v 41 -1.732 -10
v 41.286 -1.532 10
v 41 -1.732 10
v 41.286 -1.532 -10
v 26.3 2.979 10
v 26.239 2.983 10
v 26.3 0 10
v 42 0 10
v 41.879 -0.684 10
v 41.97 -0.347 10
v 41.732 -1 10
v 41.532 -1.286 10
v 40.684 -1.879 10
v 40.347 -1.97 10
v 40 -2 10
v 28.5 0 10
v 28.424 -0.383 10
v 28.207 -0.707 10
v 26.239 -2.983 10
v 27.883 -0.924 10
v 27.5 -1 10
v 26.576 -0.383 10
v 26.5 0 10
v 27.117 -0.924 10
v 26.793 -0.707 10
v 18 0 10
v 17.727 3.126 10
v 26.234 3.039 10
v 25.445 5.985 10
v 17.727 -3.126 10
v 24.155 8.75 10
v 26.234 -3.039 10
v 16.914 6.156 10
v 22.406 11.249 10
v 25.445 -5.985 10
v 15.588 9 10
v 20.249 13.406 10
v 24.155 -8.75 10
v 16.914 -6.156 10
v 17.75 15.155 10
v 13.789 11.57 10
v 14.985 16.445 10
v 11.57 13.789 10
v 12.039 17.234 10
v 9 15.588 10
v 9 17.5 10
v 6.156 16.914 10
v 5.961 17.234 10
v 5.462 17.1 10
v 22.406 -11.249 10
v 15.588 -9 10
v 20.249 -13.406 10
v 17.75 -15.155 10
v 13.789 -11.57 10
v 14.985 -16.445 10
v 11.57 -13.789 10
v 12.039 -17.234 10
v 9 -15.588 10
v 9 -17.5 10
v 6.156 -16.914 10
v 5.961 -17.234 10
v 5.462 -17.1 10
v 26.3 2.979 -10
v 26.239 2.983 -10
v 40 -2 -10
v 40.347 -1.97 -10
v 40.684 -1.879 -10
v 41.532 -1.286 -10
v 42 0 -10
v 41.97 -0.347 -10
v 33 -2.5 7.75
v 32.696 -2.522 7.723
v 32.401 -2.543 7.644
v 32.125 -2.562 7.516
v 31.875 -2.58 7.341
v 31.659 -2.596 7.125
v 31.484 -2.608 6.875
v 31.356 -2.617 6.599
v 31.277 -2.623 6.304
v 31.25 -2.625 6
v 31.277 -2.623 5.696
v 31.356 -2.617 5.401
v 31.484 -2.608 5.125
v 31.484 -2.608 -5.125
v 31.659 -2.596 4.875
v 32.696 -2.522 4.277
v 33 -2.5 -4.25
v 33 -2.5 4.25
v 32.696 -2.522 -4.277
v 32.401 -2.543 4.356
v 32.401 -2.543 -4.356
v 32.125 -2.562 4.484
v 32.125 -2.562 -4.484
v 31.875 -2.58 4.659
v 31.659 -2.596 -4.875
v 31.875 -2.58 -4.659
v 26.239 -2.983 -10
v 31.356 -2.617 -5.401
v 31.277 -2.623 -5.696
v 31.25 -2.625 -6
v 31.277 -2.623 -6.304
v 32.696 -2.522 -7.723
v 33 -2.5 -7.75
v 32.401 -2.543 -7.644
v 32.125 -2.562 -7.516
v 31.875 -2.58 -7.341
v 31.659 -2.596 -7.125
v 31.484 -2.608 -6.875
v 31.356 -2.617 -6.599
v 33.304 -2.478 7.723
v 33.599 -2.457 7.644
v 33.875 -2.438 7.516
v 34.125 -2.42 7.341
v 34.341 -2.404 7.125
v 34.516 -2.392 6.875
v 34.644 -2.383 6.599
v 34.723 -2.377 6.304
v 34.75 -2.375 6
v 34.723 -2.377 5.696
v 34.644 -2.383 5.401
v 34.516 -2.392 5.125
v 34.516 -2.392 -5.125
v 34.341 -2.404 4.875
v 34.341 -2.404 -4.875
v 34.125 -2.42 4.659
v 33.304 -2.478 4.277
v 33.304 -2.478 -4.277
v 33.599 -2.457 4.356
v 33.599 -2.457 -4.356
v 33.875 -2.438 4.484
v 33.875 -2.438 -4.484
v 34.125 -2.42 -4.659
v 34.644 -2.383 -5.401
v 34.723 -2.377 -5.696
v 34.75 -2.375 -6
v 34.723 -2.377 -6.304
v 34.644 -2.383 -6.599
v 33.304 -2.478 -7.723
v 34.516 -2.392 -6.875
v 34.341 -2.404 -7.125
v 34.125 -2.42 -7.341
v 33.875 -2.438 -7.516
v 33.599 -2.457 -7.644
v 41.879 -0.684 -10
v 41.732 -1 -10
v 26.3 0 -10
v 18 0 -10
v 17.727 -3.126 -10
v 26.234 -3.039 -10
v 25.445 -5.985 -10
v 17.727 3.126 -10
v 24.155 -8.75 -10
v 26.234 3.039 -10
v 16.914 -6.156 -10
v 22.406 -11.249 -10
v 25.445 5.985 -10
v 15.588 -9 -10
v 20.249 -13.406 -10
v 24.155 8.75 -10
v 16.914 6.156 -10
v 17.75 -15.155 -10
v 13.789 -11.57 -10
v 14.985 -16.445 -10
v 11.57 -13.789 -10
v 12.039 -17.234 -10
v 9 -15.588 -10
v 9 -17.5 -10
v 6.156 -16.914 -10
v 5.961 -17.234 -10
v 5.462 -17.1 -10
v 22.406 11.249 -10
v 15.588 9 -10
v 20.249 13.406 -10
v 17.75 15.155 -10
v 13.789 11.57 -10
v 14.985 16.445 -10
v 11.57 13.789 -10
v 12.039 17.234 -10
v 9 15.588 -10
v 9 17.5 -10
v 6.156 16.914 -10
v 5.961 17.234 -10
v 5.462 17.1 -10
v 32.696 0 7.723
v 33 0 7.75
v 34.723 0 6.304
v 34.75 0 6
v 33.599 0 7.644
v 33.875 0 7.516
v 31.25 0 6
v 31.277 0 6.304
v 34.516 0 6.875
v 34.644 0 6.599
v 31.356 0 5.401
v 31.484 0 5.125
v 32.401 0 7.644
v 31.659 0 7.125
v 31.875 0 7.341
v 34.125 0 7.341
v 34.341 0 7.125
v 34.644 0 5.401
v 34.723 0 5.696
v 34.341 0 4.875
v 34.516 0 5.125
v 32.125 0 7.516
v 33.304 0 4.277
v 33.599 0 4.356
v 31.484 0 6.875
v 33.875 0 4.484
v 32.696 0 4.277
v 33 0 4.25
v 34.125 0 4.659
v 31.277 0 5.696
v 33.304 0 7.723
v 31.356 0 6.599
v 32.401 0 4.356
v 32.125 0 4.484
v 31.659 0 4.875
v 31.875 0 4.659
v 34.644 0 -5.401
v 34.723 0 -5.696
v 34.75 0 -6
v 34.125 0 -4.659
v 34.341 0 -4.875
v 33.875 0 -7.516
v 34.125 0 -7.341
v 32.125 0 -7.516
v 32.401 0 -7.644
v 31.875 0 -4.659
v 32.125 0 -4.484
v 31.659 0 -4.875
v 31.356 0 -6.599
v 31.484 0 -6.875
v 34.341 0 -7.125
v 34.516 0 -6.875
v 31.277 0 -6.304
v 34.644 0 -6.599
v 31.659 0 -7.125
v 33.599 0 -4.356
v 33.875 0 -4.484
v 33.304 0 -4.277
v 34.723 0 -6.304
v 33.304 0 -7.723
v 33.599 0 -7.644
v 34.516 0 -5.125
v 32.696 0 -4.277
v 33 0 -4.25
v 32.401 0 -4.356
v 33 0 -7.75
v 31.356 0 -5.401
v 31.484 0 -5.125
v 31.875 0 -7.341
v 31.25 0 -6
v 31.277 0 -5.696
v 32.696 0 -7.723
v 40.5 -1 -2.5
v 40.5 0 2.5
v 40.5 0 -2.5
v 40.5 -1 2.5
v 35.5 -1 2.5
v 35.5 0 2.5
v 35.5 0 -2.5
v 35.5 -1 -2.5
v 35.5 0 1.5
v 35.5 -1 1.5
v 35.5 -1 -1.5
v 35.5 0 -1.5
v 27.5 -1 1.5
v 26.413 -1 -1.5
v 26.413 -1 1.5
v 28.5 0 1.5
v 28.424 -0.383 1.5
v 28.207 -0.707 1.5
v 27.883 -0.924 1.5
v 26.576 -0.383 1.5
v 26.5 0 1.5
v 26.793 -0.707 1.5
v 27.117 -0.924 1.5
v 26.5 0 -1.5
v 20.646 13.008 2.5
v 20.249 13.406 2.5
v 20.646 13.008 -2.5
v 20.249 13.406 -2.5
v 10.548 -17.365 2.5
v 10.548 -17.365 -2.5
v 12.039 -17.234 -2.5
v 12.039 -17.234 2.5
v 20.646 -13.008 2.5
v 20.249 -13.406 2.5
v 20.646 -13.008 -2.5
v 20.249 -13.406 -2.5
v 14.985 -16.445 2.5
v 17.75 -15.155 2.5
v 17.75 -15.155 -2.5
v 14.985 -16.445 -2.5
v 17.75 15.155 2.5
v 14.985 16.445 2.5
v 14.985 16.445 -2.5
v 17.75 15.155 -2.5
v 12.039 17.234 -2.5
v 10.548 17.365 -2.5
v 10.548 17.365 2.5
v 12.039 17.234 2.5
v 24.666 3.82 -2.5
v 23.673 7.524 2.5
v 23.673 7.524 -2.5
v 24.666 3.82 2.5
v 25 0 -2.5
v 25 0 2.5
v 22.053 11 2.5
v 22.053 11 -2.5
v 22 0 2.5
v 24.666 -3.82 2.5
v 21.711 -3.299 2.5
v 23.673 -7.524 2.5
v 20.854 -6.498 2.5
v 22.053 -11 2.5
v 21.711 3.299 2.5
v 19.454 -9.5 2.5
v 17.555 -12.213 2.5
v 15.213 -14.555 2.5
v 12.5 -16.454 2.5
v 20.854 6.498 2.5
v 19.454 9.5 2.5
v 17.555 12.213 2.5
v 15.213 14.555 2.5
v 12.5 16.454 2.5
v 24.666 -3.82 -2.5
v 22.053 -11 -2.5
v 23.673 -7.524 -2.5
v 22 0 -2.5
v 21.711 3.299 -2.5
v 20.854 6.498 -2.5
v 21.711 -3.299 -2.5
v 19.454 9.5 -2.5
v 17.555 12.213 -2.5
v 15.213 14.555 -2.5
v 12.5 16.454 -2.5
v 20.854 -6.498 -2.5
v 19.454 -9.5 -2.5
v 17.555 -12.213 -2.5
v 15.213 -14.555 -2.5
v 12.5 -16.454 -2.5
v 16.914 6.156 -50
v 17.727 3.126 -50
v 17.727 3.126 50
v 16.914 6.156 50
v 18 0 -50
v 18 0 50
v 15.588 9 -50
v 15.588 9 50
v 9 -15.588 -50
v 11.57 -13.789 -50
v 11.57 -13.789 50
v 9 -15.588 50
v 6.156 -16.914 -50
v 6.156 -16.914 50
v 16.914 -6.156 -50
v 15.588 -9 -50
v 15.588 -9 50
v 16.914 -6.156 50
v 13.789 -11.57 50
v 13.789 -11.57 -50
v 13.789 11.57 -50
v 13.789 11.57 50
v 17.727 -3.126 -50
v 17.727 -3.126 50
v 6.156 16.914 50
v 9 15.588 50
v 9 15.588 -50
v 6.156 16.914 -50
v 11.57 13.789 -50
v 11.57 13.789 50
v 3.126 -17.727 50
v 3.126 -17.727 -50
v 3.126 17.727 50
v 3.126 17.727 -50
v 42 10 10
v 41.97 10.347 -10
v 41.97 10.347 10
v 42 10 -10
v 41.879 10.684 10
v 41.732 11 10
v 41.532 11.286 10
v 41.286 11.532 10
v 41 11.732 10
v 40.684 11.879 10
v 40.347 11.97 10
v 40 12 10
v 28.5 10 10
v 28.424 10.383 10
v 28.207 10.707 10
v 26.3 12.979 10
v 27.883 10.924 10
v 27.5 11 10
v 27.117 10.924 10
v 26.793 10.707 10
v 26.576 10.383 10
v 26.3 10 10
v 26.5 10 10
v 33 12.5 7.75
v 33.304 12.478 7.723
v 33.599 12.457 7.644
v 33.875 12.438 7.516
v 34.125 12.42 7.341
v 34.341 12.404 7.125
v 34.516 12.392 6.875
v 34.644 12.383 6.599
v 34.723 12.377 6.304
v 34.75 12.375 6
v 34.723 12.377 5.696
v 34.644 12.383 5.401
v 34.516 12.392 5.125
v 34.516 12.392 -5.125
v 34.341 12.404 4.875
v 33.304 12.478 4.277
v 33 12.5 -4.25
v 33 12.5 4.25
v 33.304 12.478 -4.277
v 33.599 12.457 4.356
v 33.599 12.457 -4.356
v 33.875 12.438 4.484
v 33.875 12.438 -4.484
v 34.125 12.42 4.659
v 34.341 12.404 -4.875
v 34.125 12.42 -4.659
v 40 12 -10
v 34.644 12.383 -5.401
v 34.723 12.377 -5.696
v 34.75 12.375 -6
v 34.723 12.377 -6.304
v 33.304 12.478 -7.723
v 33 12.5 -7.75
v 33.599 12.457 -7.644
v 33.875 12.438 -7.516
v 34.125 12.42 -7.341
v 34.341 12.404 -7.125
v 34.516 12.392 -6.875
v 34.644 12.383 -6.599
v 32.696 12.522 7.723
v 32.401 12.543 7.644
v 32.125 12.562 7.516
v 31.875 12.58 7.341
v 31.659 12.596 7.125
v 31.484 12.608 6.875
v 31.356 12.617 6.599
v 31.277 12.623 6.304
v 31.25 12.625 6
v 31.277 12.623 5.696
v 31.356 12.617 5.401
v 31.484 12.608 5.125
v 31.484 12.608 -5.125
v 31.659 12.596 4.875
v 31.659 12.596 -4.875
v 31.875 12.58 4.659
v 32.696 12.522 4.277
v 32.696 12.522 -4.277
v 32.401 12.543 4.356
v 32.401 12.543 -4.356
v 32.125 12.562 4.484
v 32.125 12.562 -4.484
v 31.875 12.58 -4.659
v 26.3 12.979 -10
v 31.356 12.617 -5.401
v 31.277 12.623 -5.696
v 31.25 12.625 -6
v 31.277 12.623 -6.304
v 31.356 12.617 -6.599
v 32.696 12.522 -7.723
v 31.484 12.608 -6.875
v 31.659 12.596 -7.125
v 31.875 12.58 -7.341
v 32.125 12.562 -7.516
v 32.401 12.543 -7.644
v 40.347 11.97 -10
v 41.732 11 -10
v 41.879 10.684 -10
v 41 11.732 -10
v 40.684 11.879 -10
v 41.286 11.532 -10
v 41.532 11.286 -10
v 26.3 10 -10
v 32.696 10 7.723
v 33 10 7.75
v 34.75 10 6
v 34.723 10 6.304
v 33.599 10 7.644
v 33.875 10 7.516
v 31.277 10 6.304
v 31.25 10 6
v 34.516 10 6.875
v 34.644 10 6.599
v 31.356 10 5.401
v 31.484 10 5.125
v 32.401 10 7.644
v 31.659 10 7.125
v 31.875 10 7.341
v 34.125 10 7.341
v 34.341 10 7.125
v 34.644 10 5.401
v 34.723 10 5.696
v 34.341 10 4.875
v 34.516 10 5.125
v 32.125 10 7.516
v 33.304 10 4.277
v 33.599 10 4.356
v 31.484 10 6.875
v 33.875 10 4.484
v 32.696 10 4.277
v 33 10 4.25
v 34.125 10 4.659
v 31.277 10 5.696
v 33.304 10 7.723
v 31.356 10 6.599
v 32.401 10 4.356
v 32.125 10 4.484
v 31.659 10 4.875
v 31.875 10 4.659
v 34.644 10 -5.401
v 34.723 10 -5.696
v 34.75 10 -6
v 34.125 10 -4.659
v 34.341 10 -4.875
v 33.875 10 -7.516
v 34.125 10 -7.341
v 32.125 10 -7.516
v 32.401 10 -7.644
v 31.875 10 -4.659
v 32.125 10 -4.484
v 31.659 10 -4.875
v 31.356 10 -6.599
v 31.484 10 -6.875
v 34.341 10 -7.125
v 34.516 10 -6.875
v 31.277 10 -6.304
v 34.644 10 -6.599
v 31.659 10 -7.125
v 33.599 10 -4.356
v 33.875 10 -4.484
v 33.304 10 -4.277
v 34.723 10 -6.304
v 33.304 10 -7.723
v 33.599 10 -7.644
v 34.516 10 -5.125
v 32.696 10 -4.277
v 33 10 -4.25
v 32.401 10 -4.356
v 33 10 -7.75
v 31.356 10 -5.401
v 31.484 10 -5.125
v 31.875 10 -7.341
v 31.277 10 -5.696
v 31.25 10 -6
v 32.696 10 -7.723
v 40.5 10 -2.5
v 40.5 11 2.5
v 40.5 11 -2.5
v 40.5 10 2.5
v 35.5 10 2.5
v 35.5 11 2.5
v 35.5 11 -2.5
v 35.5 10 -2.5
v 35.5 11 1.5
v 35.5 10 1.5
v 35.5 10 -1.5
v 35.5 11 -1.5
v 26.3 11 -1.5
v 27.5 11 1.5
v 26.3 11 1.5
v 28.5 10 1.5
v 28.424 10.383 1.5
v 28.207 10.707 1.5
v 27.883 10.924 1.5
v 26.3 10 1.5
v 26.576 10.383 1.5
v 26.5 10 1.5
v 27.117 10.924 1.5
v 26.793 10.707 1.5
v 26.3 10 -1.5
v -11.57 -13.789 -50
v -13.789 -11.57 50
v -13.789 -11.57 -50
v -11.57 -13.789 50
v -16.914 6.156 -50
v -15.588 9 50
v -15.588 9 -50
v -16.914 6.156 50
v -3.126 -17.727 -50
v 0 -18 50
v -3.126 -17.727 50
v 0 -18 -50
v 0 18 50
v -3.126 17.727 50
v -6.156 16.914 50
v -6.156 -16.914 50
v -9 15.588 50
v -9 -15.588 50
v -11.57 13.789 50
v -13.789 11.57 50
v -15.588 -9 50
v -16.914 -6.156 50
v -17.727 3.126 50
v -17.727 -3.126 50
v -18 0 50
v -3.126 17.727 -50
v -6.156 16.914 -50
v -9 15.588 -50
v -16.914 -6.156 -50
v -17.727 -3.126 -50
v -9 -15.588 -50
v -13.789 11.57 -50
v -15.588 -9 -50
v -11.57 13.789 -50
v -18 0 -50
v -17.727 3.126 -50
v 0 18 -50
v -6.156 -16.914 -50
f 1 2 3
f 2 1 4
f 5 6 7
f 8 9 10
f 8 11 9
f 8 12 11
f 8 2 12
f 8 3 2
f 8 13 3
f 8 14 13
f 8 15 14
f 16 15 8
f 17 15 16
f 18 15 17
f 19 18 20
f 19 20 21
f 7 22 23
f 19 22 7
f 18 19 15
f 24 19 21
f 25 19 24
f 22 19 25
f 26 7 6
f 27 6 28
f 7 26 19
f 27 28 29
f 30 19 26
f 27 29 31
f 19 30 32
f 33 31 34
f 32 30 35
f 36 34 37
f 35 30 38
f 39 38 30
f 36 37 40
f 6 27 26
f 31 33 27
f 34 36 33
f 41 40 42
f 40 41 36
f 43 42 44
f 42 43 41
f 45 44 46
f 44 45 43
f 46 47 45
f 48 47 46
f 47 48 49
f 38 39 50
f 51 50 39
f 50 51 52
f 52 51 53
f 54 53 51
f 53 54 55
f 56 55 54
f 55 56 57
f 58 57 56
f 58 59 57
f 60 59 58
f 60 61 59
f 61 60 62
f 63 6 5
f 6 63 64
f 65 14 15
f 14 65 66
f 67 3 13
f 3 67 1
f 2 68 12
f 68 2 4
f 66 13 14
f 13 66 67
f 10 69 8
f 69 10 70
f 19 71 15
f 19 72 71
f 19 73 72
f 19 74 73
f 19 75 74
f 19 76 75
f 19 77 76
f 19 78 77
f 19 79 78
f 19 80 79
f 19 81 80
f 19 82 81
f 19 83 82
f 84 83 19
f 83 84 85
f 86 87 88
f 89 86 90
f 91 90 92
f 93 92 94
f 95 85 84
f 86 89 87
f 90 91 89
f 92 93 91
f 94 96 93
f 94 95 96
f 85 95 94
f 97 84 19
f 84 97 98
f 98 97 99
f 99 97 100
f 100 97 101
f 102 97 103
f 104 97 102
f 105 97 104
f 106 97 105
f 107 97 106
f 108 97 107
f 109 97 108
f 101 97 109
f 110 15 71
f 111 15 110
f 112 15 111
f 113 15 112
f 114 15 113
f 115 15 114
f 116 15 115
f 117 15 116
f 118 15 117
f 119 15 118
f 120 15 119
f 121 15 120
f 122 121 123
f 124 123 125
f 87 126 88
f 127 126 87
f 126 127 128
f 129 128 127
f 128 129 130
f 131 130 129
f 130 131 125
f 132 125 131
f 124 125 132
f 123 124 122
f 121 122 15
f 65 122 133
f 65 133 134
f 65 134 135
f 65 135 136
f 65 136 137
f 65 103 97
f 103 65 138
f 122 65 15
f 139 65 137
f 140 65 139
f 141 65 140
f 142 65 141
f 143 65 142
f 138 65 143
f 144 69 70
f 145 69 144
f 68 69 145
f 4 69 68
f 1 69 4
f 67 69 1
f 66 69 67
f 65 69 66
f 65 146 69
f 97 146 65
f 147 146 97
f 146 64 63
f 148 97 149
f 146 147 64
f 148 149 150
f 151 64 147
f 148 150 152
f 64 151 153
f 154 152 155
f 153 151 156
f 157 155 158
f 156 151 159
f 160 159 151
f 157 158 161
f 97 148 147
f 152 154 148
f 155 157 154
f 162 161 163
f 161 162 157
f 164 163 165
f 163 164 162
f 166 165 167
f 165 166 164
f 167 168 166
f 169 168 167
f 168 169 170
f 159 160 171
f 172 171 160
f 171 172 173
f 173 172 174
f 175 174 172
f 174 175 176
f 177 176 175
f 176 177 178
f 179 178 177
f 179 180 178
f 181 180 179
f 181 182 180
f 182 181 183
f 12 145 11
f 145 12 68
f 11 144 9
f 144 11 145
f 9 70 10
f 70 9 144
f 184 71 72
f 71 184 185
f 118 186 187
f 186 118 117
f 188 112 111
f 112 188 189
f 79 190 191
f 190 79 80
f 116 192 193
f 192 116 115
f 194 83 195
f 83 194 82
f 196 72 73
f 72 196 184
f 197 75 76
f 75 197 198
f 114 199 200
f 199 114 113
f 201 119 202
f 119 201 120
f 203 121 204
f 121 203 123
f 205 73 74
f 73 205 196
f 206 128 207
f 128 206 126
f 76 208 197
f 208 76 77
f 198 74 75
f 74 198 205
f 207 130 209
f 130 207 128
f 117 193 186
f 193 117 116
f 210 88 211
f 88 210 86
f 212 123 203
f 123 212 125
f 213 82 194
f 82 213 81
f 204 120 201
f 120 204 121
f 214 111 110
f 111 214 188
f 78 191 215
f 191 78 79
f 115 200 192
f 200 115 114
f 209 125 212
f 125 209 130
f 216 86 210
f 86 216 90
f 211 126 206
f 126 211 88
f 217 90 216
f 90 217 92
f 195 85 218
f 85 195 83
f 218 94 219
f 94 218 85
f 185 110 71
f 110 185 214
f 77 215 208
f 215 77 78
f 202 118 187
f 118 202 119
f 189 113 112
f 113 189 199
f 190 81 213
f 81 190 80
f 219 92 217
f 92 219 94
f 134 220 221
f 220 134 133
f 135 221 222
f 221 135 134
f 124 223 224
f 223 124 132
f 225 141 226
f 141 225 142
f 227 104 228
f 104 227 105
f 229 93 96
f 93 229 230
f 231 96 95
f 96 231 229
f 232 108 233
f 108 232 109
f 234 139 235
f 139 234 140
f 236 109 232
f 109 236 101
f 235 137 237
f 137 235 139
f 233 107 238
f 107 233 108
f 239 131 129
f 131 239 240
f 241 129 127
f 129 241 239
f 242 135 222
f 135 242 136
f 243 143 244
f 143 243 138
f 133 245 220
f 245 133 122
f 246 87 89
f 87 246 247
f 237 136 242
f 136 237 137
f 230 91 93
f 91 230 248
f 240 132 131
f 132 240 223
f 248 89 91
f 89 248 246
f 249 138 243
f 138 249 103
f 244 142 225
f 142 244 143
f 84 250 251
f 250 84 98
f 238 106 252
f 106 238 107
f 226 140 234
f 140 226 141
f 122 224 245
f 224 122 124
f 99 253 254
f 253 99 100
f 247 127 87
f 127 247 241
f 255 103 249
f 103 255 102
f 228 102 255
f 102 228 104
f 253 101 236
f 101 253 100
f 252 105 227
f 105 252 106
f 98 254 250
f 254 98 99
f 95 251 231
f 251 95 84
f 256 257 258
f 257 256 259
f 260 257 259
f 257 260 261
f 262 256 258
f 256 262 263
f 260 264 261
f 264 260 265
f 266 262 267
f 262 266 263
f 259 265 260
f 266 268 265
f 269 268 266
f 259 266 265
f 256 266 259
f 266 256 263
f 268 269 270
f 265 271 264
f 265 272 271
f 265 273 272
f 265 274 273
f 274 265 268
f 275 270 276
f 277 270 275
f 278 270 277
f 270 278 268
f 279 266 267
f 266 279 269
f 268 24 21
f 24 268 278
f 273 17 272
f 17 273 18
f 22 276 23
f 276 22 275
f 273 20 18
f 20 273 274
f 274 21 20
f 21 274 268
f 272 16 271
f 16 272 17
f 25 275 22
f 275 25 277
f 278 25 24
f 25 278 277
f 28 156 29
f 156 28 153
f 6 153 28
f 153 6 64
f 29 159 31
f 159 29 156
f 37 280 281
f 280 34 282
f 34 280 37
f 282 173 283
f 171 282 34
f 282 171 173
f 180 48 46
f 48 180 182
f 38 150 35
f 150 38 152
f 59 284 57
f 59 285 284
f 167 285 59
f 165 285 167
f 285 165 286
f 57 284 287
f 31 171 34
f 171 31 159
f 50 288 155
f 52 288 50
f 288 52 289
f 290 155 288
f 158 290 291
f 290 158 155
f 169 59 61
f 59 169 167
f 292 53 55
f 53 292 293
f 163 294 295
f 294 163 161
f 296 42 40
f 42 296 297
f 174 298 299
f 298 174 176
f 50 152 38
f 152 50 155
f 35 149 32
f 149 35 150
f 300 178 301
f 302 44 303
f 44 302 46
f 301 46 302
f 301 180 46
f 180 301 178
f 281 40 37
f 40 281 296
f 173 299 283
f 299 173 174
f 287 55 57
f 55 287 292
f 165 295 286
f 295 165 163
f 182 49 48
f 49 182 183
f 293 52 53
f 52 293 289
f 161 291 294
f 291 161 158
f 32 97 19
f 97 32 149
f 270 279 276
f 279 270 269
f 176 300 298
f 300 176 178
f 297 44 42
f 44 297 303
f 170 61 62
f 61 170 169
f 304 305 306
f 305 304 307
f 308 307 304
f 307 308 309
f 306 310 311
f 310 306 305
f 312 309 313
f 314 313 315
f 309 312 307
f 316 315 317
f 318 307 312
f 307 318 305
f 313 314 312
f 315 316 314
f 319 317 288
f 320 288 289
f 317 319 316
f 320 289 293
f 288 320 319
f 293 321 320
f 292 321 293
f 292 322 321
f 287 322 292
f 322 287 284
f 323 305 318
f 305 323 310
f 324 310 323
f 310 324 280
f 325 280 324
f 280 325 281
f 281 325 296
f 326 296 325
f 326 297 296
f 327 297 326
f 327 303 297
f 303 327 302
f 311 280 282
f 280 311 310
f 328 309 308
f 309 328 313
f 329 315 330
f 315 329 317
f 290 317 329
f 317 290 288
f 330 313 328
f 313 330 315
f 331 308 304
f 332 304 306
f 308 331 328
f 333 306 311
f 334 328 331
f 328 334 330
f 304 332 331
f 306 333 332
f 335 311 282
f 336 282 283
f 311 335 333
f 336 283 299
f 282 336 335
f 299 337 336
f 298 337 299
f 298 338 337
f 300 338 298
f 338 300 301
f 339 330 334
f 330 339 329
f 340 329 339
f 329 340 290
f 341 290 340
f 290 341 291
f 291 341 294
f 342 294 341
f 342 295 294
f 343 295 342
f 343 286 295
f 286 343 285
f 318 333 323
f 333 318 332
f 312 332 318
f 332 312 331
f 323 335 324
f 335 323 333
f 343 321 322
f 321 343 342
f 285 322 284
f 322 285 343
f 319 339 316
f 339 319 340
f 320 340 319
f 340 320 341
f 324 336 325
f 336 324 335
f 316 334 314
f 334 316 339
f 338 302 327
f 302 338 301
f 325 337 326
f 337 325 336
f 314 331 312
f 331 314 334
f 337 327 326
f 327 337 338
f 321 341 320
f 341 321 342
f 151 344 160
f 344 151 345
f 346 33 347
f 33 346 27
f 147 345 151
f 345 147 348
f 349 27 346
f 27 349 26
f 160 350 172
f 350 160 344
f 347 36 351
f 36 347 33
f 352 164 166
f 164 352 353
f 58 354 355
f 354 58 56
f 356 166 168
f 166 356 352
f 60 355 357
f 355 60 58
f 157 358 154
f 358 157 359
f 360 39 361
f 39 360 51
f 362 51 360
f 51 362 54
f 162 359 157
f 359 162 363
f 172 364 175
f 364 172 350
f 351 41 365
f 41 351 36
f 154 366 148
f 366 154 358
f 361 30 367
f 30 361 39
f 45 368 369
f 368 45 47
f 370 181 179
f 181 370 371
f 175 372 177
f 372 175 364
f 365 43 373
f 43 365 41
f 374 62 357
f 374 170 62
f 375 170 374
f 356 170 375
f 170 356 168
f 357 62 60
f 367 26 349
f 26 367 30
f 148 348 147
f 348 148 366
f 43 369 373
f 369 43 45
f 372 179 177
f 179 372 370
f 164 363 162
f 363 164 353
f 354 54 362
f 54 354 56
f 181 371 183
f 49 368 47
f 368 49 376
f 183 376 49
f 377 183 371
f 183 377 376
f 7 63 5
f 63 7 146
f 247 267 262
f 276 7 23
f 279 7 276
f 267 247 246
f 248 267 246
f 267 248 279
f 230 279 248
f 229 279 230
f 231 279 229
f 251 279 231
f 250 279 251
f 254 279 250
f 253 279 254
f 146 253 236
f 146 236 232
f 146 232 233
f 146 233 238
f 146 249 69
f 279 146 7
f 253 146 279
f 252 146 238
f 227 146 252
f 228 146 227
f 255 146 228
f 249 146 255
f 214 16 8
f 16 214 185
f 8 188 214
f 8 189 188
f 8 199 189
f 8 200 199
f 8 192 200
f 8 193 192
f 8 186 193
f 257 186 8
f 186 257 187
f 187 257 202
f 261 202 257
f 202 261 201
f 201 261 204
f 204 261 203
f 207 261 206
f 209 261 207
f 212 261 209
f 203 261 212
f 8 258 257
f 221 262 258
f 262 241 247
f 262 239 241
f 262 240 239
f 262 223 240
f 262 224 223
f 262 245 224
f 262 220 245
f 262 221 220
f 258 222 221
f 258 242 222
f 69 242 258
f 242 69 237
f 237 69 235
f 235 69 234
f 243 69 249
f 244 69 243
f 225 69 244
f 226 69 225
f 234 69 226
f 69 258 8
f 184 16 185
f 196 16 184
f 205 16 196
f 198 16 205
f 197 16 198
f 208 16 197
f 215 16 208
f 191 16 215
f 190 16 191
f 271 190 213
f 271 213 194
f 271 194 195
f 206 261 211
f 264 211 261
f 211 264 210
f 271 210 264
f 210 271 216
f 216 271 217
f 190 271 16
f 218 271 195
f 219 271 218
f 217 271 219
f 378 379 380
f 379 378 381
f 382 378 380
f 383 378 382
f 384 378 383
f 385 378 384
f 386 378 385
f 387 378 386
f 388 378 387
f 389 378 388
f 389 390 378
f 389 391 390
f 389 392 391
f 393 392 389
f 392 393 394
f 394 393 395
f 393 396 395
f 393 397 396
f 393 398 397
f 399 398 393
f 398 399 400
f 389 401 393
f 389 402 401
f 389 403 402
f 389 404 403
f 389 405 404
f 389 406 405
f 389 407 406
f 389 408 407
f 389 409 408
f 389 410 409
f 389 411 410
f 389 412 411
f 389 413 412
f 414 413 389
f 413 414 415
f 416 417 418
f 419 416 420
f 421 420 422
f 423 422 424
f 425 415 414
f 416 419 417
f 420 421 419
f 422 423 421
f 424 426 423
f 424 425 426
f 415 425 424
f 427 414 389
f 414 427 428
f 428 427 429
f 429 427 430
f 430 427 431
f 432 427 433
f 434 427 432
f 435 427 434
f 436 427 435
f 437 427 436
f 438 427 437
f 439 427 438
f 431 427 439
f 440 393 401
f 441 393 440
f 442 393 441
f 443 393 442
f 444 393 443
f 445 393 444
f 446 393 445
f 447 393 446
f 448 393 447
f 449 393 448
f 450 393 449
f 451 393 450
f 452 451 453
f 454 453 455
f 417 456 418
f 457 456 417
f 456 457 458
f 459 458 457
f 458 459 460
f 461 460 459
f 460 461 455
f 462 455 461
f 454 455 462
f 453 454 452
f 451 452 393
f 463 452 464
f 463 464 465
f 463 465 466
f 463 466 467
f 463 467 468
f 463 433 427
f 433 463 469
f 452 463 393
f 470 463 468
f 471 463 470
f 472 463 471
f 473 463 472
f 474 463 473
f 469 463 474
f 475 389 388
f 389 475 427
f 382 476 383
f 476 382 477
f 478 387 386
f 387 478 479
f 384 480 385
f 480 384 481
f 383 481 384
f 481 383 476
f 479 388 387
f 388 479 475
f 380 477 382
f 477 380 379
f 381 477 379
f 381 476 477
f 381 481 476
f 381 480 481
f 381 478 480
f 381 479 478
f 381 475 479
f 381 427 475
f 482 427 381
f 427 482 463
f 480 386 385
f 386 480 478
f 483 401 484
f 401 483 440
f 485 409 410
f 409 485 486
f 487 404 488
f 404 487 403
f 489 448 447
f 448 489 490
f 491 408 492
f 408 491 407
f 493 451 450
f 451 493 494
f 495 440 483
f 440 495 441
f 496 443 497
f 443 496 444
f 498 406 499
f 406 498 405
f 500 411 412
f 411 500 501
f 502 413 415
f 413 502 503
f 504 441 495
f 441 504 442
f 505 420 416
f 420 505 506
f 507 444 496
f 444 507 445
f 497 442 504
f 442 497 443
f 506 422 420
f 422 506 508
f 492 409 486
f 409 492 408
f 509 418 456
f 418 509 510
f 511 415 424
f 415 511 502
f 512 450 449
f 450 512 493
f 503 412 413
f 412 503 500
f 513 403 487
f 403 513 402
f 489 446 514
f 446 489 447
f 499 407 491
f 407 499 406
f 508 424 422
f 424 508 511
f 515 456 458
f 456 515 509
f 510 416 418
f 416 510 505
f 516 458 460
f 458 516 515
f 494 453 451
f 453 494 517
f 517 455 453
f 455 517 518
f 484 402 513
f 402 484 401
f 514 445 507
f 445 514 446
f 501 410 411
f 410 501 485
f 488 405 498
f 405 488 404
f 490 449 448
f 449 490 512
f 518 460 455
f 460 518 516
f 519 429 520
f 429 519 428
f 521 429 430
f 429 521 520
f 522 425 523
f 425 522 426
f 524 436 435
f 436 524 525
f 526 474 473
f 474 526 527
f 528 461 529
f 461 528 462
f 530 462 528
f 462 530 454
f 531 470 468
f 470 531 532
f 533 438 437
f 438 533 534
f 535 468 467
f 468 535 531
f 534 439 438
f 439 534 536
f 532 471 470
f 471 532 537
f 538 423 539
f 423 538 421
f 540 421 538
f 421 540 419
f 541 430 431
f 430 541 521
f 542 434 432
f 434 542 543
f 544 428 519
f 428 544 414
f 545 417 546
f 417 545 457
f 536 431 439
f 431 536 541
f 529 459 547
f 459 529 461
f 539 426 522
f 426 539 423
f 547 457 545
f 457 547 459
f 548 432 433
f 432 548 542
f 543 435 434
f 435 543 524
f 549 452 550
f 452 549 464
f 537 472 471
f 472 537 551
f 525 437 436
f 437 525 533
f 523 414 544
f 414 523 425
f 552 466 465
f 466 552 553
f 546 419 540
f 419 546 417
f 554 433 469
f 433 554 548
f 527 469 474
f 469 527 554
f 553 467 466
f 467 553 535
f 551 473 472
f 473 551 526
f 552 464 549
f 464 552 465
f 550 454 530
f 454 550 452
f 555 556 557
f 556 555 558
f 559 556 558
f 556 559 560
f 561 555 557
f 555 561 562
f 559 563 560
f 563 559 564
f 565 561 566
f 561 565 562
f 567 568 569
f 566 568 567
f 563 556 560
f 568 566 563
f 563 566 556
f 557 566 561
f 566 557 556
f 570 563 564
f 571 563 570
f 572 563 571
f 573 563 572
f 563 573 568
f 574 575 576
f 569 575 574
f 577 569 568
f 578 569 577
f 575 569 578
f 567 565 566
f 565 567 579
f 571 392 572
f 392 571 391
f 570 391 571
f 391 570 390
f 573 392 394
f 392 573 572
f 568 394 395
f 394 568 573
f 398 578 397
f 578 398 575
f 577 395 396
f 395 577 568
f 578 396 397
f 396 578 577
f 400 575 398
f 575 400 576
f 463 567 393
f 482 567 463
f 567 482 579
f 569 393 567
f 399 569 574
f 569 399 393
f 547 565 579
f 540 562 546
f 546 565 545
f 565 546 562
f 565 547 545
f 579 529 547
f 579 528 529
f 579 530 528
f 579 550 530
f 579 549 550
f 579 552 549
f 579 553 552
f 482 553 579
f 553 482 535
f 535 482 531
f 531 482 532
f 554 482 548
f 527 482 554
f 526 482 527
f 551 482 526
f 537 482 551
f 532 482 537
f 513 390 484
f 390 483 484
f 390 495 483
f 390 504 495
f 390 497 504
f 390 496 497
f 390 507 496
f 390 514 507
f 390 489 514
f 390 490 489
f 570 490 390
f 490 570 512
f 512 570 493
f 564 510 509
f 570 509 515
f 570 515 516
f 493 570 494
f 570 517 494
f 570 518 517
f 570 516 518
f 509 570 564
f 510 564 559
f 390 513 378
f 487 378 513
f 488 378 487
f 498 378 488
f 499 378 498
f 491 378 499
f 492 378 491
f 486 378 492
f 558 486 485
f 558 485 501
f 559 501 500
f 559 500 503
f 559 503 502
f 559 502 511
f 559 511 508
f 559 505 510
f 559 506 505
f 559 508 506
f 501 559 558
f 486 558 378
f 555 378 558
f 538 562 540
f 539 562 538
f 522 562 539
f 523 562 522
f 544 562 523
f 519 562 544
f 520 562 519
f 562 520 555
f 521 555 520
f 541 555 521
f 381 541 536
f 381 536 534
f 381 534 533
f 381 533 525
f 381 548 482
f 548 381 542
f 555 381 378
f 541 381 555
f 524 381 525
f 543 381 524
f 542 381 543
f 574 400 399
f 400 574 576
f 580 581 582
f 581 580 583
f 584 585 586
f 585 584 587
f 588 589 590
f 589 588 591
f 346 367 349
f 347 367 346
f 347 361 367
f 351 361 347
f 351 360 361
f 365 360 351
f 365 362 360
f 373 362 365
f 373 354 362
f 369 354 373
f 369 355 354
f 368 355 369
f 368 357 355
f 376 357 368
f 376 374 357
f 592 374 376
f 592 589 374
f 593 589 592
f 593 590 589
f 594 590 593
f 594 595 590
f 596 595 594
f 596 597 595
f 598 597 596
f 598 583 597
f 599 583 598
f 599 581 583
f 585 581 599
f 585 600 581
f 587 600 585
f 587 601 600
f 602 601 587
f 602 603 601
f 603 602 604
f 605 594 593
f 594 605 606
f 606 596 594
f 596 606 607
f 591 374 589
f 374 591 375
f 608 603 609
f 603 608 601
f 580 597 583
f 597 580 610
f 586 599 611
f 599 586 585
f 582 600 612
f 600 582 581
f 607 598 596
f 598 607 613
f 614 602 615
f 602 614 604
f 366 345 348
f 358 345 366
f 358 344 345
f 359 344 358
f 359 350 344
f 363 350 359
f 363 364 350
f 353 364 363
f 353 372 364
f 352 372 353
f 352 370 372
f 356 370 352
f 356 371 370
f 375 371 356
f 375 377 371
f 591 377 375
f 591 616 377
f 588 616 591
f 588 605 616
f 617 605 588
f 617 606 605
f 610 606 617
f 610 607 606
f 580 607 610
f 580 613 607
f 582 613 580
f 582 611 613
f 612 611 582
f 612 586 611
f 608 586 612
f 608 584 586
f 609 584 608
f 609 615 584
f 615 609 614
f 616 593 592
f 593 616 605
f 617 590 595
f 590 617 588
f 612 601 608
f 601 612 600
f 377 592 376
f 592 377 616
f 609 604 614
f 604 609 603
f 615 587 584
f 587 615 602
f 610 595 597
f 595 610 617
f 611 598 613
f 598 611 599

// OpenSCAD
module velotube() {
    cylinder(d=36, h=100, $fn=36, center=true);
}

module diffcube() {
    translate([46.3,20,0])
        cube([40,40,40], center=true);
}

module sensorcase() {
    difference() {
        hull() {
            translate([40,0,0])
                cylinder(d=4, h=20, $fn=36, center=true);
            translate([26,0,0])
                cylinder(d=6, h=20, $fn=36, center=true);
        }
        
        translate([33,0,6])
            rotate([90,0,0])
                cylinder(d=3.5, h=20, $fn=36, center=true);

        translate([33,0,-6])
            rotate([90,0,0])
                cylinder(d=3.5, h=20, $fn=36, center=true);
        
        translate([38,0,0])
            cube([5,2,5], center=true);

        translate([33,0,0])
            cube([14,2,3], center=true);
        
        translate([27.5,0,0])
            cylinder(d=2, h=10.01, $fn=16);
    }
}

module sensormount() {
    difference() {
        union() {
            translate([9,0,0])
                cylinder(d=35, h=20, $fn=36, center=true);
            sensorcase();
        }
        velotube();
        cylinder(d=36, h=100, $fn=36, center=true);
        
        translate([3,0,0])    
            difference() {
                cylinder(d=44, h=5, $fn=36, center=true);
                cylinder(d=38, h=5.01, $fn=36, center=true);
            }
        diffcube();
    }

}

module sensorhood() {
    intersection() {
        sensorcase();
        diffcube();
    }
}

velotube();

sensormount();

translate([0,10,0])
    sensorhood();
